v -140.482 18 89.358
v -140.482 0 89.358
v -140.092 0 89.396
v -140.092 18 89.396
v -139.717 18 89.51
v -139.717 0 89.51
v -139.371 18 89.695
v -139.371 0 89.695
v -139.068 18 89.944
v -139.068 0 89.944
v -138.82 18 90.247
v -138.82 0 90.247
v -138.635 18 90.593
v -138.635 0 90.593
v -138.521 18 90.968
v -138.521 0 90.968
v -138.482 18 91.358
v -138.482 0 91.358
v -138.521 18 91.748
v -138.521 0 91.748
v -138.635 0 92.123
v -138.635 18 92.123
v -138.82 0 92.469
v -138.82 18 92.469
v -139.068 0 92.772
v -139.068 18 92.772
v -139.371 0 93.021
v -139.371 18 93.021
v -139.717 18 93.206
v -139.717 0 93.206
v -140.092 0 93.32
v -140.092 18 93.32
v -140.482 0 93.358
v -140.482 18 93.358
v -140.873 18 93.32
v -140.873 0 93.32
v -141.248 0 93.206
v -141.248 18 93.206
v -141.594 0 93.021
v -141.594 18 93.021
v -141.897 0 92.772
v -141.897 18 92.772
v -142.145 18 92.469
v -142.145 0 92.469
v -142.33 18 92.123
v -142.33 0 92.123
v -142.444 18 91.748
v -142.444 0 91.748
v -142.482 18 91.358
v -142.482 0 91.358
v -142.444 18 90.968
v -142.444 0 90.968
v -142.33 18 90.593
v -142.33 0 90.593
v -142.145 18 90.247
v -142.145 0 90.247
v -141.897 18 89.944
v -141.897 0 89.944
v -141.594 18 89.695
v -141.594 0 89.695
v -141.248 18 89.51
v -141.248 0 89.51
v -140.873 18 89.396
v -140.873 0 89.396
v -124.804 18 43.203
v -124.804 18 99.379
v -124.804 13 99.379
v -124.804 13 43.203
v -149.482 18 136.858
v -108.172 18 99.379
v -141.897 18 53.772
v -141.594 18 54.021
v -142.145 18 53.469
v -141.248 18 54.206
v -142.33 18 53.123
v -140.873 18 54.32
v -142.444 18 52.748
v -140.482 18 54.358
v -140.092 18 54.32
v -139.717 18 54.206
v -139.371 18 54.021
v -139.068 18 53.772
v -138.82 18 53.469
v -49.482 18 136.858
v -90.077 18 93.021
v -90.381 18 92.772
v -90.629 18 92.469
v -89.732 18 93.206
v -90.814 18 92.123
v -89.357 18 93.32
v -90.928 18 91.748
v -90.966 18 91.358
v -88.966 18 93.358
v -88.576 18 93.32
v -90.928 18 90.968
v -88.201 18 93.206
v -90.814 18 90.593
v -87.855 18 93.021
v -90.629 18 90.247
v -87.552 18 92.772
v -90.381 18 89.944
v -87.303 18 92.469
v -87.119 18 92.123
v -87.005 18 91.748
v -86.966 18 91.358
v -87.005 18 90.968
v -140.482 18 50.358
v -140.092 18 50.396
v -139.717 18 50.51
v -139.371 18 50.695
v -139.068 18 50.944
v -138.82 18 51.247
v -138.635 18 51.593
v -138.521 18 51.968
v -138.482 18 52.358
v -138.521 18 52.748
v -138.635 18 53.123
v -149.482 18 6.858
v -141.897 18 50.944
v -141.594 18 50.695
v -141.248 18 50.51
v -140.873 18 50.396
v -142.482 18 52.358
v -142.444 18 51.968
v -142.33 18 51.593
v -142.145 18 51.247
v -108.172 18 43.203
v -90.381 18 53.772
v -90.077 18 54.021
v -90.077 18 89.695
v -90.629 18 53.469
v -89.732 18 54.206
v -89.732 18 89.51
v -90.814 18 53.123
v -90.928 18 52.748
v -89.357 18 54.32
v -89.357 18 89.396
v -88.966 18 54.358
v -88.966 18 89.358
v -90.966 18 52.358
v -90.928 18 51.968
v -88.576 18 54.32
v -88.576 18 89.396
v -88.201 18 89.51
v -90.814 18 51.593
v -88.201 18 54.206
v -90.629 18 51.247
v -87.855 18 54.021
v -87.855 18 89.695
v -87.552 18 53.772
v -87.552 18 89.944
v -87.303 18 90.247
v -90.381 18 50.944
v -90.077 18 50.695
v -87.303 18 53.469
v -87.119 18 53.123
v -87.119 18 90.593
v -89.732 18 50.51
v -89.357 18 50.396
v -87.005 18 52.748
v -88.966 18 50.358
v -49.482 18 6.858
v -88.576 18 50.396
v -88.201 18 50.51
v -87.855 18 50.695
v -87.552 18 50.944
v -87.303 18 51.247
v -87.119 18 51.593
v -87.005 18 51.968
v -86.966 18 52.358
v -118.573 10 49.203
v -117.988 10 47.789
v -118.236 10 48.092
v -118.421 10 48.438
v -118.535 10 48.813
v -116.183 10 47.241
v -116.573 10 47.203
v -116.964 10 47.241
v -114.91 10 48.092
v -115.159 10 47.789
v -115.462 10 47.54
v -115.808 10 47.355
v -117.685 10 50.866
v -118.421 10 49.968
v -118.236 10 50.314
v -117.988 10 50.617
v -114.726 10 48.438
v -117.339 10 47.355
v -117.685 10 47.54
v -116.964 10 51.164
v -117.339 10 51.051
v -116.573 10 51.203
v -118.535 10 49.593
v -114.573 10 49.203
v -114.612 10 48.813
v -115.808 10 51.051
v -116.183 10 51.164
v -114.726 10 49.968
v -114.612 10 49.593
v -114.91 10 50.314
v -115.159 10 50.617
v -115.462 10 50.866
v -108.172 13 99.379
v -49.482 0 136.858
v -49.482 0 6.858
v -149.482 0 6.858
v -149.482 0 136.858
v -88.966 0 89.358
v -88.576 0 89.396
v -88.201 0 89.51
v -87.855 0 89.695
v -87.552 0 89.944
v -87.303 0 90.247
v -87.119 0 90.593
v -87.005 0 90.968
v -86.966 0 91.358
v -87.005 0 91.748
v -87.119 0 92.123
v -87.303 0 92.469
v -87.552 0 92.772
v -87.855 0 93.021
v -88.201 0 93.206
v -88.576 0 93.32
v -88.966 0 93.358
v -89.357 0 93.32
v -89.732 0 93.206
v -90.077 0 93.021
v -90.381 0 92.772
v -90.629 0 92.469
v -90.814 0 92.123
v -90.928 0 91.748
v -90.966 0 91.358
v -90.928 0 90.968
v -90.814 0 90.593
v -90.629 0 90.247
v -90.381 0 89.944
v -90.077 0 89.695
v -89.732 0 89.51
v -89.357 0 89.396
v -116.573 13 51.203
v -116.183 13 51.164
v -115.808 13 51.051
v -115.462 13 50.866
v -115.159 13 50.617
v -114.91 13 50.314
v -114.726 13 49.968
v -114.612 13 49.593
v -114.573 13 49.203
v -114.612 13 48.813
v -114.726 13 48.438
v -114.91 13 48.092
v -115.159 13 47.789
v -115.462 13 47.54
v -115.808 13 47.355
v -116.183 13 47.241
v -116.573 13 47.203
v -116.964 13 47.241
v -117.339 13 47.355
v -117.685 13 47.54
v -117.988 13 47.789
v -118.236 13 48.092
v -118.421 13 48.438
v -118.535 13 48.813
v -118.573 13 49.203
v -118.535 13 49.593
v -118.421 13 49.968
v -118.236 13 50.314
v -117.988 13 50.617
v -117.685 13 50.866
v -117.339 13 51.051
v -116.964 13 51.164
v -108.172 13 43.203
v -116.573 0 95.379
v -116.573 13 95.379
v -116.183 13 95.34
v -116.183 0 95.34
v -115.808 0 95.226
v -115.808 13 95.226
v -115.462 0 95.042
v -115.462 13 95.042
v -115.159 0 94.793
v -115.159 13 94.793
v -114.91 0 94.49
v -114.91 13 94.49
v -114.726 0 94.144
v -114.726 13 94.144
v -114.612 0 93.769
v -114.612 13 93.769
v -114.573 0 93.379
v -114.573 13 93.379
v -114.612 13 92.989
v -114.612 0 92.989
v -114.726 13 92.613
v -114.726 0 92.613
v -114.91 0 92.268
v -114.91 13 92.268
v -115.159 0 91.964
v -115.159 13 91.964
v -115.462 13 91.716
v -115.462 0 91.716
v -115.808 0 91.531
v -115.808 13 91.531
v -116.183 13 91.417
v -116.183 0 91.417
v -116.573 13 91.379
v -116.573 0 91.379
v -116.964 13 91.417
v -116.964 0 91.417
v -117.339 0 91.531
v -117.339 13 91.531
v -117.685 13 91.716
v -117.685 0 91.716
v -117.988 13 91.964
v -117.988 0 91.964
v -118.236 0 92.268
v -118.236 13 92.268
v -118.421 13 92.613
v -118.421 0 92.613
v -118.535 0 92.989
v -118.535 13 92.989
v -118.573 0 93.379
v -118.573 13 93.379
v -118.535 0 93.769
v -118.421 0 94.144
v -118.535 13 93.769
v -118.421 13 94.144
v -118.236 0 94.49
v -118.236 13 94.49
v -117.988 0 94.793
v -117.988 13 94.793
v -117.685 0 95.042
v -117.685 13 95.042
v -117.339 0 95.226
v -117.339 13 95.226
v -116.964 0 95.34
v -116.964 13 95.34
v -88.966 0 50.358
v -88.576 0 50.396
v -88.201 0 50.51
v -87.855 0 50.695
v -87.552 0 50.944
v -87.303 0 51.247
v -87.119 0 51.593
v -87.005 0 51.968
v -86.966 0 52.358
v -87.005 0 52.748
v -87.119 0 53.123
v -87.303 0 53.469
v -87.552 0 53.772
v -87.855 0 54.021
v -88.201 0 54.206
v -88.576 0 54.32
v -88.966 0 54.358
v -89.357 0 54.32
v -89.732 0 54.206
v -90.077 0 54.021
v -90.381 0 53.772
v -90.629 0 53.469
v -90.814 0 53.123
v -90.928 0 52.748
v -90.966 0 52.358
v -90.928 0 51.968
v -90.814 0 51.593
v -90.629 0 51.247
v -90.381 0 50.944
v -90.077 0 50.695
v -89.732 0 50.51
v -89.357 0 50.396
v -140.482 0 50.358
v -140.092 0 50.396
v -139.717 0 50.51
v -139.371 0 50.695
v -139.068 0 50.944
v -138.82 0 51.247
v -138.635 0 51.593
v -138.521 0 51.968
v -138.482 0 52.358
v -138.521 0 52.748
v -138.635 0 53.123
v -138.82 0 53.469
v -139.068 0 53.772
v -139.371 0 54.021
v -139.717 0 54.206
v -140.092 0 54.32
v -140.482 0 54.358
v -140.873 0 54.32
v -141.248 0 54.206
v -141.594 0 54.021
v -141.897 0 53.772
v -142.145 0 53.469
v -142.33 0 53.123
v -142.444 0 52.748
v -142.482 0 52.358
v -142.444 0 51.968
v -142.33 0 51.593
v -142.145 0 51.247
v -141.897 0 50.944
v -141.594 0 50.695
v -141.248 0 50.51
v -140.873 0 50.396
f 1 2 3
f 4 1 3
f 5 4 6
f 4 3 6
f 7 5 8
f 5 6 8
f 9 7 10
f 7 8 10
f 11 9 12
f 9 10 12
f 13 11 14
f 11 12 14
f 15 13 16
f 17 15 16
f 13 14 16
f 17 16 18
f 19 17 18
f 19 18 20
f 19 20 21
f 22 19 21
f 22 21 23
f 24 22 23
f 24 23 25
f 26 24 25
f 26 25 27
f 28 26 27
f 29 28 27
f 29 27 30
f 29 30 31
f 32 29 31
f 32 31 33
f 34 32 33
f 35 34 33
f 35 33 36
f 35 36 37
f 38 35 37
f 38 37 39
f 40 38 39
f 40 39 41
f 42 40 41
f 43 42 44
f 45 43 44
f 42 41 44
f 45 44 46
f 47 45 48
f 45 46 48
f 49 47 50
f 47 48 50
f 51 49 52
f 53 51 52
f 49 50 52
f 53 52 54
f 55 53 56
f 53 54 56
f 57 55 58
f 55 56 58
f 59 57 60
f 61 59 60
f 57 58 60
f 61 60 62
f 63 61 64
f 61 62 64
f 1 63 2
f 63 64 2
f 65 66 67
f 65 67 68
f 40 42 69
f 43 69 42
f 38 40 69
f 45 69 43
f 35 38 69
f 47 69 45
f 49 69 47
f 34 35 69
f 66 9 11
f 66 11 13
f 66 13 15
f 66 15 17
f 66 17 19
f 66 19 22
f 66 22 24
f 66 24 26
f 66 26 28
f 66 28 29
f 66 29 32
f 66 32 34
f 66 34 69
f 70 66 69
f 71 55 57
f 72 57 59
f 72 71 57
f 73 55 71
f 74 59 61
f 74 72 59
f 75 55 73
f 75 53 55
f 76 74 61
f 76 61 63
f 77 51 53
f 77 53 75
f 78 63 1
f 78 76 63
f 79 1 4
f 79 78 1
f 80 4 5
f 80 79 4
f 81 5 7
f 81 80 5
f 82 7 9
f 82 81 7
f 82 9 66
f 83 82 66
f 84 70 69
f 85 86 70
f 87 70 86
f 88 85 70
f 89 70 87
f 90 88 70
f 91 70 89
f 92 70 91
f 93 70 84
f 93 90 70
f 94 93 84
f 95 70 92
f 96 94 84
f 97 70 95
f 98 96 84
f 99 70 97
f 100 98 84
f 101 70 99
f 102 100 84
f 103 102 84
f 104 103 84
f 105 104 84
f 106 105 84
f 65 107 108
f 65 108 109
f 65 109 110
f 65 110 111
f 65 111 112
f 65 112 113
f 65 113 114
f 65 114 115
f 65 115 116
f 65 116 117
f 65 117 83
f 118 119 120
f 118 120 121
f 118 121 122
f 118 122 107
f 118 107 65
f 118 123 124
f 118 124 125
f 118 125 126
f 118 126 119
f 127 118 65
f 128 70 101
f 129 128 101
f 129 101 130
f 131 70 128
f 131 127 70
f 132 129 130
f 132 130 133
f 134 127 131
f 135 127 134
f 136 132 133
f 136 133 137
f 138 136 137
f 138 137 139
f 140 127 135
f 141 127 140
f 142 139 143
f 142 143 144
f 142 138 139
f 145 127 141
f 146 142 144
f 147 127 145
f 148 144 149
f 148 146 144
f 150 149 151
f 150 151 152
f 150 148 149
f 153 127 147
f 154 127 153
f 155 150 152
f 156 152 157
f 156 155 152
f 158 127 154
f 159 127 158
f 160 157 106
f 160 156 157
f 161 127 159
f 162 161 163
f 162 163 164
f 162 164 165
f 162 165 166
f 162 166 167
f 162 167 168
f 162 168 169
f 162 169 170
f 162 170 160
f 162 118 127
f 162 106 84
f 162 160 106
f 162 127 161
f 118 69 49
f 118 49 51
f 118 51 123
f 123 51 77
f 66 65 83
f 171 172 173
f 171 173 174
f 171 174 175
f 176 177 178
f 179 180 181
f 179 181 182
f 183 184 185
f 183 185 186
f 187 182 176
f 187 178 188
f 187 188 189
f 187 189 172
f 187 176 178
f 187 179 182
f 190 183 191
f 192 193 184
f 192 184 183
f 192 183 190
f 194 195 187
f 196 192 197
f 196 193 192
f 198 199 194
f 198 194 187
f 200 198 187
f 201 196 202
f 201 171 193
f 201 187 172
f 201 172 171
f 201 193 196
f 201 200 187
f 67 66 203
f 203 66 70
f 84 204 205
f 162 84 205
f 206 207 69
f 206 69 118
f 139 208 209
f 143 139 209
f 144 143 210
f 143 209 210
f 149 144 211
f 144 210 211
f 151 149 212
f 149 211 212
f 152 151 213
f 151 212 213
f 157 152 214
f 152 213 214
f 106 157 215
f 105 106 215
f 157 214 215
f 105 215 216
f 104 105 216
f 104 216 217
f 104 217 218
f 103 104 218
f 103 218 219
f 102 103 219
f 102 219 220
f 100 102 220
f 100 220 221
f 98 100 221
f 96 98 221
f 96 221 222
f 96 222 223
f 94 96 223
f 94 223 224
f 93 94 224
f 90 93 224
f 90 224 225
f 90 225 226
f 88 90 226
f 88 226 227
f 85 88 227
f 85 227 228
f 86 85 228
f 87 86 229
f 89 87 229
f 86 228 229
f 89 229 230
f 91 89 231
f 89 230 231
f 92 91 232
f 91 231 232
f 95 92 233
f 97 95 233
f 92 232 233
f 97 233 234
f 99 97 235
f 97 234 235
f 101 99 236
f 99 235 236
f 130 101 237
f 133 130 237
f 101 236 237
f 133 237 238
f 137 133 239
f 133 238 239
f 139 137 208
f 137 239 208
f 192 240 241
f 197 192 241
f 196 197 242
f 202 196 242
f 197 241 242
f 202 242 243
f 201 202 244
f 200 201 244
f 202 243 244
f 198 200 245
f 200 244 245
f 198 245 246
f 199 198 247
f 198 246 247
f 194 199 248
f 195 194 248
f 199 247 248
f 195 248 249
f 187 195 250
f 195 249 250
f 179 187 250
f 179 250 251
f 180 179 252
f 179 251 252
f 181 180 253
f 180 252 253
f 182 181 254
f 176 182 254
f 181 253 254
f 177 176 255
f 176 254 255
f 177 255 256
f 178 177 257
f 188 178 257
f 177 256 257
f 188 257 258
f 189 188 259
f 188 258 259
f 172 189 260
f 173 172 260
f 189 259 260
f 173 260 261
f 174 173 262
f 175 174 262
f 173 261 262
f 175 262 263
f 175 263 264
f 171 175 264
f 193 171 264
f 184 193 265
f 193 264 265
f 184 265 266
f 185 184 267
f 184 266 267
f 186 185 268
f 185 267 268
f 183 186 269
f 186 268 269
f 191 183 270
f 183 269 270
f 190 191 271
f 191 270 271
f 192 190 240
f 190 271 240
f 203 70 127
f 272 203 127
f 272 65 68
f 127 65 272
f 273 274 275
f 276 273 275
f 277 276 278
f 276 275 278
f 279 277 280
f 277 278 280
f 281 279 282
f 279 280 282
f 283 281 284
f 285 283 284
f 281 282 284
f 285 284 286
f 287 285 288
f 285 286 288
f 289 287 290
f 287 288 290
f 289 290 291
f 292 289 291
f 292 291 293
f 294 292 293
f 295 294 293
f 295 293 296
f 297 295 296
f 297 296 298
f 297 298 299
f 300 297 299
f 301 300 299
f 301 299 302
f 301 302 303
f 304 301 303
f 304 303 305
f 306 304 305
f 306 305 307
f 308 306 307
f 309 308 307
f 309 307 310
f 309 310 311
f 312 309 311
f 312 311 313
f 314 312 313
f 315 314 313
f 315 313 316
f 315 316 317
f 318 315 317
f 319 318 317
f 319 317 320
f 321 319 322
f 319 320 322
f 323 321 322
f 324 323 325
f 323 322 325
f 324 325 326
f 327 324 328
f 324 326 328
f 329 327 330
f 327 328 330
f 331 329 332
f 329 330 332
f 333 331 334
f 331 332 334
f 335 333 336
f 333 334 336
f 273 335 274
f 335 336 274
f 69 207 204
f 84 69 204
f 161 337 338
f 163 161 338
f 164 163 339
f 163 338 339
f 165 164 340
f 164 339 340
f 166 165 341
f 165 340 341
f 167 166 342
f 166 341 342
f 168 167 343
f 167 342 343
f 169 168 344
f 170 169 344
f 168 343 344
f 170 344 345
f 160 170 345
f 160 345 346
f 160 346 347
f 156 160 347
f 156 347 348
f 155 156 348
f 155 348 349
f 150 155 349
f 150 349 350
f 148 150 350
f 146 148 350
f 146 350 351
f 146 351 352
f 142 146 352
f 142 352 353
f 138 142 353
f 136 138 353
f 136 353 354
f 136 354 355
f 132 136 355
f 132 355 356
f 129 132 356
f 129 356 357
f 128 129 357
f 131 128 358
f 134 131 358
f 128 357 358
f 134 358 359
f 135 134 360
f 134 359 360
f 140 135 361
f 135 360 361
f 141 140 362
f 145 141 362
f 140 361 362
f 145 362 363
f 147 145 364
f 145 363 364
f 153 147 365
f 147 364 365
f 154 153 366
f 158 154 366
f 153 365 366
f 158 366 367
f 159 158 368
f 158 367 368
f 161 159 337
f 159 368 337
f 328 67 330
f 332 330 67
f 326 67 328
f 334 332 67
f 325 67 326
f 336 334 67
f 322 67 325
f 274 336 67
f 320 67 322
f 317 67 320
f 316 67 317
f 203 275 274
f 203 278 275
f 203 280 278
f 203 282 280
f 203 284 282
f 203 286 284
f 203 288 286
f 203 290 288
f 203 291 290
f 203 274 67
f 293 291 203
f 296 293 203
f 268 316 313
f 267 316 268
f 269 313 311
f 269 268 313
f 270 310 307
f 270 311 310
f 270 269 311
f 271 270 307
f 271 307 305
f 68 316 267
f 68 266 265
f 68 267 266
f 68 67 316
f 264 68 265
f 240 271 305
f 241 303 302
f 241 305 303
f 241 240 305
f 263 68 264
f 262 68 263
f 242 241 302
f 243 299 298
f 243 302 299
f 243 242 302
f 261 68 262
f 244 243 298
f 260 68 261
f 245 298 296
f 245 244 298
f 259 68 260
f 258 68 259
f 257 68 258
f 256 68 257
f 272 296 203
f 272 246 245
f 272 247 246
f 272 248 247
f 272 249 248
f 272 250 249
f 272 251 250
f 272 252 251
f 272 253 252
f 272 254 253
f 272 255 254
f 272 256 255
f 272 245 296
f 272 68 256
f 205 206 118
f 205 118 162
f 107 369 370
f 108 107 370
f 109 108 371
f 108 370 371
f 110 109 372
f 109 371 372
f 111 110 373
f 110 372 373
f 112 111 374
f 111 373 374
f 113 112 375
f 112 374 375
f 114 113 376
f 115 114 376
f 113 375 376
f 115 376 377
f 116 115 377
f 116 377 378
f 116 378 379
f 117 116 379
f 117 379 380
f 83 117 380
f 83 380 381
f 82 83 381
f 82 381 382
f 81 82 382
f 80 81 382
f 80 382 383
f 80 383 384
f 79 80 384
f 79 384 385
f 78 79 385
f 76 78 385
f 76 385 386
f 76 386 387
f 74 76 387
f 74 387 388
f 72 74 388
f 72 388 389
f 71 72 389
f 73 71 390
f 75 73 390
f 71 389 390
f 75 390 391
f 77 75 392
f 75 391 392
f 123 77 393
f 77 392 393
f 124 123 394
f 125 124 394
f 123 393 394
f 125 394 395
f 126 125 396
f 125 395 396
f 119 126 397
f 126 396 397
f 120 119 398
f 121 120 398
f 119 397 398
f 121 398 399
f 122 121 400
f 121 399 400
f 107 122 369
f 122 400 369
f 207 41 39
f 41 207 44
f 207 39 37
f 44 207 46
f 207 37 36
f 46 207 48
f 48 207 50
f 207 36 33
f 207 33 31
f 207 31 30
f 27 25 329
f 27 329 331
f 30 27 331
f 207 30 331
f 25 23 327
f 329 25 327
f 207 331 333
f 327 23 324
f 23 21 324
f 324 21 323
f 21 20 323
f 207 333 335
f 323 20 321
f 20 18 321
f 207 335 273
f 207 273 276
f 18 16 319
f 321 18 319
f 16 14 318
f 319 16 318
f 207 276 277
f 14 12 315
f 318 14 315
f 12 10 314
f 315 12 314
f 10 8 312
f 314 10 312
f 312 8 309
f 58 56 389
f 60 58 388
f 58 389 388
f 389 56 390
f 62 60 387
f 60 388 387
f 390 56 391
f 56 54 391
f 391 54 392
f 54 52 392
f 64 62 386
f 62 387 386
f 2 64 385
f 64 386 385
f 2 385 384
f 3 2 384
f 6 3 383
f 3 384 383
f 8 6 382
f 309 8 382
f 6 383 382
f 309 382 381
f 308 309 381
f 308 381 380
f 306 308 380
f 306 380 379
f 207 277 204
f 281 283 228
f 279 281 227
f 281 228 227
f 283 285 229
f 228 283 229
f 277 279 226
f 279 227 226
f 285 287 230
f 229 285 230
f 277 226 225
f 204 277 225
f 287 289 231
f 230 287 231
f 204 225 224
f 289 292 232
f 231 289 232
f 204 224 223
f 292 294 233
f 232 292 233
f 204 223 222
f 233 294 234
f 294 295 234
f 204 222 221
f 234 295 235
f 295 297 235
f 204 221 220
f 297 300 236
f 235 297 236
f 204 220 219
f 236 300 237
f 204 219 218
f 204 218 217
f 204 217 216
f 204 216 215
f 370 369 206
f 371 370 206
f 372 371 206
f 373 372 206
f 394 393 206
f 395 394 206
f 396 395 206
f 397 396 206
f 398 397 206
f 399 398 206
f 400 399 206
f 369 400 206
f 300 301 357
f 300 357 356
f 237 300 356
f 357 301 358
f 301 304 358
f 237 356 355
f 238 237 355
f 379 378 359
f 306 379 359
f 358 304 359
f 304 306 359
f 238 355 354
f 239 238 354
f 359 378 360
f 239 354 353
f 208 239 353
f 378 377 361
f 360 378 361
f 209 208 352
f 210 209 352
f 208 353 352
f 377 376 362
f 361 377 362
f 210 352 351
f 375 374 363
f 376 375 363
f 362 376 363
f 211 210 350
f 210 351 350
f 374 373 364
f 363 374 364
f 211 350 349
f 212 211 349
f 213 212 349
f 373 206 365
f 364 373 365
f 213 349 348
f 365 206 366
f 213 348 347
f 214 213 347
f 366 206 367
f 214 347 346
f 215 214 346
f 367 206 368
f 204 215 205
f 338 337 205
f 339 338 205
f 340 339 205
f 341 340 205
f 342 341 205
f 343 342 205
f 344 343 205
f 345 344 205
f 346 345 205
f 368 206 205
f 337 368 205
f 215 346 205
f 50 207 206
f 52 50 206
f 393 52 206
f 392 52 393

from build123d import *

# Parameters (mm, degrees)
ESQUISSE1_W             = 100
ESQUISSE1_H             = 130
BOSS_EXTRU_1_DEPTH      = 18
ESQUISSE2_R             = 2
ENL_V_MAT_EXTRU_1_DEPTH = 204.467720042
ESQUISSE3_R             = 2
ENL_V_MAT_EXTRU_2_DEPTH = 204.467720042
ESQUISSE6_W             = 16.632413999
ESQUISSE6_H             = 56.175813279
ENL_V_MAT_EXTRU_5_DEPTH = 5
ESQUISSE8_R             = 2
ENL_V_MAT_EXTRU_6_DEPTH = 3


with BuildPart() as part:
    # Esquisse1 → Boss.-Extru.1 (new body)
    with BuildSketch(Plane(origin=(0, 0, 0), x_dir=(1, 0, 0), z_dir=(0, 1, 0))):
        with Locations((-99.482451284, -71.857991573)):
            Rectangle(ESQUISSE1_W, ESQUISSE1_H)
    extrude(amount=BOSS_EXTRU_1_DEPTH)

    # Esquisse2 → Enlèv. mat.-Extru.1 (cut, through all)
    with BuildSketch(Plane(origin=(0, 18, 0), x_dir=(1, 0, 0), z_dir=(0, 1, 0))):
        with Locations(Location((-116.573423844, -93.378684857, 0), (0, 0, 270))):
            Circle(ESQUISSE2_R)
    extrude(amount=-ENL_V_MAT_EXTRU_1_DEPTH, mode=Mode.SUBTRACT)

    # Esquisse3 → Enlèv. mat.-Extru.2 (cut, through all)
    with BuildSketch(Plane.XZ):
        with Locations(Location((-88.966331324, 52.357991573, 0), (0, 0, 270))):
            Circle(ESQUISSE3_R)
        with Locations(Location((-88.966331324, 91.357991573, 0), (0, 0, 270))):
            Circle(ESQUISSE3_R)
        with Locations(Location((-140.482451284, 91.357991573, 0), (0, 0, 270))):
            Circle(ESQUISSE3_R)
        with Locations(Location((-140.482451284, 52.357991573, 0), (0, 0, 270))):
            Circle(ESQUISSE3_R)
    extrude(amount=-ENL_V_MAT_EXTRU_2_DEPTH, mode=Mode.SUBTRACT)

    # Esquisse6 → Enlèv. mat.-Extru.5 (cut)
    with BuildSketch(Plane(origin=(0, 18, 0), x_dir=(1, 0, 0), z_dir=(0, 1, 0))):
        with Locations((-116.487794331, -71.290778218)):
            Rectangle(ESQUISSE6_W, ESQUISSE6_H)
    extrude(amount=-ENL_V_MAT_EXTRU_5_DEPTH, mode=Mode.SUBTRACT)

    # Esquisse8 → Enlèv. mat.-Extru.6 (cut)
    with BuildSketch(Plane(origin=(0, 13, 0), x_dir=(1, 0, 0), z_dir=(0, 1, 0))):
        with Locations(Location((-116.573423844, -49.202871578, 0), (0, 0, 270))):
            Circle(ESQUISSE8_R)
    extrude(amount=-ENL_V_MAT_EXTRU_6_DEPTH, mode=Mode.SUBTRACT)


solid = part.part
